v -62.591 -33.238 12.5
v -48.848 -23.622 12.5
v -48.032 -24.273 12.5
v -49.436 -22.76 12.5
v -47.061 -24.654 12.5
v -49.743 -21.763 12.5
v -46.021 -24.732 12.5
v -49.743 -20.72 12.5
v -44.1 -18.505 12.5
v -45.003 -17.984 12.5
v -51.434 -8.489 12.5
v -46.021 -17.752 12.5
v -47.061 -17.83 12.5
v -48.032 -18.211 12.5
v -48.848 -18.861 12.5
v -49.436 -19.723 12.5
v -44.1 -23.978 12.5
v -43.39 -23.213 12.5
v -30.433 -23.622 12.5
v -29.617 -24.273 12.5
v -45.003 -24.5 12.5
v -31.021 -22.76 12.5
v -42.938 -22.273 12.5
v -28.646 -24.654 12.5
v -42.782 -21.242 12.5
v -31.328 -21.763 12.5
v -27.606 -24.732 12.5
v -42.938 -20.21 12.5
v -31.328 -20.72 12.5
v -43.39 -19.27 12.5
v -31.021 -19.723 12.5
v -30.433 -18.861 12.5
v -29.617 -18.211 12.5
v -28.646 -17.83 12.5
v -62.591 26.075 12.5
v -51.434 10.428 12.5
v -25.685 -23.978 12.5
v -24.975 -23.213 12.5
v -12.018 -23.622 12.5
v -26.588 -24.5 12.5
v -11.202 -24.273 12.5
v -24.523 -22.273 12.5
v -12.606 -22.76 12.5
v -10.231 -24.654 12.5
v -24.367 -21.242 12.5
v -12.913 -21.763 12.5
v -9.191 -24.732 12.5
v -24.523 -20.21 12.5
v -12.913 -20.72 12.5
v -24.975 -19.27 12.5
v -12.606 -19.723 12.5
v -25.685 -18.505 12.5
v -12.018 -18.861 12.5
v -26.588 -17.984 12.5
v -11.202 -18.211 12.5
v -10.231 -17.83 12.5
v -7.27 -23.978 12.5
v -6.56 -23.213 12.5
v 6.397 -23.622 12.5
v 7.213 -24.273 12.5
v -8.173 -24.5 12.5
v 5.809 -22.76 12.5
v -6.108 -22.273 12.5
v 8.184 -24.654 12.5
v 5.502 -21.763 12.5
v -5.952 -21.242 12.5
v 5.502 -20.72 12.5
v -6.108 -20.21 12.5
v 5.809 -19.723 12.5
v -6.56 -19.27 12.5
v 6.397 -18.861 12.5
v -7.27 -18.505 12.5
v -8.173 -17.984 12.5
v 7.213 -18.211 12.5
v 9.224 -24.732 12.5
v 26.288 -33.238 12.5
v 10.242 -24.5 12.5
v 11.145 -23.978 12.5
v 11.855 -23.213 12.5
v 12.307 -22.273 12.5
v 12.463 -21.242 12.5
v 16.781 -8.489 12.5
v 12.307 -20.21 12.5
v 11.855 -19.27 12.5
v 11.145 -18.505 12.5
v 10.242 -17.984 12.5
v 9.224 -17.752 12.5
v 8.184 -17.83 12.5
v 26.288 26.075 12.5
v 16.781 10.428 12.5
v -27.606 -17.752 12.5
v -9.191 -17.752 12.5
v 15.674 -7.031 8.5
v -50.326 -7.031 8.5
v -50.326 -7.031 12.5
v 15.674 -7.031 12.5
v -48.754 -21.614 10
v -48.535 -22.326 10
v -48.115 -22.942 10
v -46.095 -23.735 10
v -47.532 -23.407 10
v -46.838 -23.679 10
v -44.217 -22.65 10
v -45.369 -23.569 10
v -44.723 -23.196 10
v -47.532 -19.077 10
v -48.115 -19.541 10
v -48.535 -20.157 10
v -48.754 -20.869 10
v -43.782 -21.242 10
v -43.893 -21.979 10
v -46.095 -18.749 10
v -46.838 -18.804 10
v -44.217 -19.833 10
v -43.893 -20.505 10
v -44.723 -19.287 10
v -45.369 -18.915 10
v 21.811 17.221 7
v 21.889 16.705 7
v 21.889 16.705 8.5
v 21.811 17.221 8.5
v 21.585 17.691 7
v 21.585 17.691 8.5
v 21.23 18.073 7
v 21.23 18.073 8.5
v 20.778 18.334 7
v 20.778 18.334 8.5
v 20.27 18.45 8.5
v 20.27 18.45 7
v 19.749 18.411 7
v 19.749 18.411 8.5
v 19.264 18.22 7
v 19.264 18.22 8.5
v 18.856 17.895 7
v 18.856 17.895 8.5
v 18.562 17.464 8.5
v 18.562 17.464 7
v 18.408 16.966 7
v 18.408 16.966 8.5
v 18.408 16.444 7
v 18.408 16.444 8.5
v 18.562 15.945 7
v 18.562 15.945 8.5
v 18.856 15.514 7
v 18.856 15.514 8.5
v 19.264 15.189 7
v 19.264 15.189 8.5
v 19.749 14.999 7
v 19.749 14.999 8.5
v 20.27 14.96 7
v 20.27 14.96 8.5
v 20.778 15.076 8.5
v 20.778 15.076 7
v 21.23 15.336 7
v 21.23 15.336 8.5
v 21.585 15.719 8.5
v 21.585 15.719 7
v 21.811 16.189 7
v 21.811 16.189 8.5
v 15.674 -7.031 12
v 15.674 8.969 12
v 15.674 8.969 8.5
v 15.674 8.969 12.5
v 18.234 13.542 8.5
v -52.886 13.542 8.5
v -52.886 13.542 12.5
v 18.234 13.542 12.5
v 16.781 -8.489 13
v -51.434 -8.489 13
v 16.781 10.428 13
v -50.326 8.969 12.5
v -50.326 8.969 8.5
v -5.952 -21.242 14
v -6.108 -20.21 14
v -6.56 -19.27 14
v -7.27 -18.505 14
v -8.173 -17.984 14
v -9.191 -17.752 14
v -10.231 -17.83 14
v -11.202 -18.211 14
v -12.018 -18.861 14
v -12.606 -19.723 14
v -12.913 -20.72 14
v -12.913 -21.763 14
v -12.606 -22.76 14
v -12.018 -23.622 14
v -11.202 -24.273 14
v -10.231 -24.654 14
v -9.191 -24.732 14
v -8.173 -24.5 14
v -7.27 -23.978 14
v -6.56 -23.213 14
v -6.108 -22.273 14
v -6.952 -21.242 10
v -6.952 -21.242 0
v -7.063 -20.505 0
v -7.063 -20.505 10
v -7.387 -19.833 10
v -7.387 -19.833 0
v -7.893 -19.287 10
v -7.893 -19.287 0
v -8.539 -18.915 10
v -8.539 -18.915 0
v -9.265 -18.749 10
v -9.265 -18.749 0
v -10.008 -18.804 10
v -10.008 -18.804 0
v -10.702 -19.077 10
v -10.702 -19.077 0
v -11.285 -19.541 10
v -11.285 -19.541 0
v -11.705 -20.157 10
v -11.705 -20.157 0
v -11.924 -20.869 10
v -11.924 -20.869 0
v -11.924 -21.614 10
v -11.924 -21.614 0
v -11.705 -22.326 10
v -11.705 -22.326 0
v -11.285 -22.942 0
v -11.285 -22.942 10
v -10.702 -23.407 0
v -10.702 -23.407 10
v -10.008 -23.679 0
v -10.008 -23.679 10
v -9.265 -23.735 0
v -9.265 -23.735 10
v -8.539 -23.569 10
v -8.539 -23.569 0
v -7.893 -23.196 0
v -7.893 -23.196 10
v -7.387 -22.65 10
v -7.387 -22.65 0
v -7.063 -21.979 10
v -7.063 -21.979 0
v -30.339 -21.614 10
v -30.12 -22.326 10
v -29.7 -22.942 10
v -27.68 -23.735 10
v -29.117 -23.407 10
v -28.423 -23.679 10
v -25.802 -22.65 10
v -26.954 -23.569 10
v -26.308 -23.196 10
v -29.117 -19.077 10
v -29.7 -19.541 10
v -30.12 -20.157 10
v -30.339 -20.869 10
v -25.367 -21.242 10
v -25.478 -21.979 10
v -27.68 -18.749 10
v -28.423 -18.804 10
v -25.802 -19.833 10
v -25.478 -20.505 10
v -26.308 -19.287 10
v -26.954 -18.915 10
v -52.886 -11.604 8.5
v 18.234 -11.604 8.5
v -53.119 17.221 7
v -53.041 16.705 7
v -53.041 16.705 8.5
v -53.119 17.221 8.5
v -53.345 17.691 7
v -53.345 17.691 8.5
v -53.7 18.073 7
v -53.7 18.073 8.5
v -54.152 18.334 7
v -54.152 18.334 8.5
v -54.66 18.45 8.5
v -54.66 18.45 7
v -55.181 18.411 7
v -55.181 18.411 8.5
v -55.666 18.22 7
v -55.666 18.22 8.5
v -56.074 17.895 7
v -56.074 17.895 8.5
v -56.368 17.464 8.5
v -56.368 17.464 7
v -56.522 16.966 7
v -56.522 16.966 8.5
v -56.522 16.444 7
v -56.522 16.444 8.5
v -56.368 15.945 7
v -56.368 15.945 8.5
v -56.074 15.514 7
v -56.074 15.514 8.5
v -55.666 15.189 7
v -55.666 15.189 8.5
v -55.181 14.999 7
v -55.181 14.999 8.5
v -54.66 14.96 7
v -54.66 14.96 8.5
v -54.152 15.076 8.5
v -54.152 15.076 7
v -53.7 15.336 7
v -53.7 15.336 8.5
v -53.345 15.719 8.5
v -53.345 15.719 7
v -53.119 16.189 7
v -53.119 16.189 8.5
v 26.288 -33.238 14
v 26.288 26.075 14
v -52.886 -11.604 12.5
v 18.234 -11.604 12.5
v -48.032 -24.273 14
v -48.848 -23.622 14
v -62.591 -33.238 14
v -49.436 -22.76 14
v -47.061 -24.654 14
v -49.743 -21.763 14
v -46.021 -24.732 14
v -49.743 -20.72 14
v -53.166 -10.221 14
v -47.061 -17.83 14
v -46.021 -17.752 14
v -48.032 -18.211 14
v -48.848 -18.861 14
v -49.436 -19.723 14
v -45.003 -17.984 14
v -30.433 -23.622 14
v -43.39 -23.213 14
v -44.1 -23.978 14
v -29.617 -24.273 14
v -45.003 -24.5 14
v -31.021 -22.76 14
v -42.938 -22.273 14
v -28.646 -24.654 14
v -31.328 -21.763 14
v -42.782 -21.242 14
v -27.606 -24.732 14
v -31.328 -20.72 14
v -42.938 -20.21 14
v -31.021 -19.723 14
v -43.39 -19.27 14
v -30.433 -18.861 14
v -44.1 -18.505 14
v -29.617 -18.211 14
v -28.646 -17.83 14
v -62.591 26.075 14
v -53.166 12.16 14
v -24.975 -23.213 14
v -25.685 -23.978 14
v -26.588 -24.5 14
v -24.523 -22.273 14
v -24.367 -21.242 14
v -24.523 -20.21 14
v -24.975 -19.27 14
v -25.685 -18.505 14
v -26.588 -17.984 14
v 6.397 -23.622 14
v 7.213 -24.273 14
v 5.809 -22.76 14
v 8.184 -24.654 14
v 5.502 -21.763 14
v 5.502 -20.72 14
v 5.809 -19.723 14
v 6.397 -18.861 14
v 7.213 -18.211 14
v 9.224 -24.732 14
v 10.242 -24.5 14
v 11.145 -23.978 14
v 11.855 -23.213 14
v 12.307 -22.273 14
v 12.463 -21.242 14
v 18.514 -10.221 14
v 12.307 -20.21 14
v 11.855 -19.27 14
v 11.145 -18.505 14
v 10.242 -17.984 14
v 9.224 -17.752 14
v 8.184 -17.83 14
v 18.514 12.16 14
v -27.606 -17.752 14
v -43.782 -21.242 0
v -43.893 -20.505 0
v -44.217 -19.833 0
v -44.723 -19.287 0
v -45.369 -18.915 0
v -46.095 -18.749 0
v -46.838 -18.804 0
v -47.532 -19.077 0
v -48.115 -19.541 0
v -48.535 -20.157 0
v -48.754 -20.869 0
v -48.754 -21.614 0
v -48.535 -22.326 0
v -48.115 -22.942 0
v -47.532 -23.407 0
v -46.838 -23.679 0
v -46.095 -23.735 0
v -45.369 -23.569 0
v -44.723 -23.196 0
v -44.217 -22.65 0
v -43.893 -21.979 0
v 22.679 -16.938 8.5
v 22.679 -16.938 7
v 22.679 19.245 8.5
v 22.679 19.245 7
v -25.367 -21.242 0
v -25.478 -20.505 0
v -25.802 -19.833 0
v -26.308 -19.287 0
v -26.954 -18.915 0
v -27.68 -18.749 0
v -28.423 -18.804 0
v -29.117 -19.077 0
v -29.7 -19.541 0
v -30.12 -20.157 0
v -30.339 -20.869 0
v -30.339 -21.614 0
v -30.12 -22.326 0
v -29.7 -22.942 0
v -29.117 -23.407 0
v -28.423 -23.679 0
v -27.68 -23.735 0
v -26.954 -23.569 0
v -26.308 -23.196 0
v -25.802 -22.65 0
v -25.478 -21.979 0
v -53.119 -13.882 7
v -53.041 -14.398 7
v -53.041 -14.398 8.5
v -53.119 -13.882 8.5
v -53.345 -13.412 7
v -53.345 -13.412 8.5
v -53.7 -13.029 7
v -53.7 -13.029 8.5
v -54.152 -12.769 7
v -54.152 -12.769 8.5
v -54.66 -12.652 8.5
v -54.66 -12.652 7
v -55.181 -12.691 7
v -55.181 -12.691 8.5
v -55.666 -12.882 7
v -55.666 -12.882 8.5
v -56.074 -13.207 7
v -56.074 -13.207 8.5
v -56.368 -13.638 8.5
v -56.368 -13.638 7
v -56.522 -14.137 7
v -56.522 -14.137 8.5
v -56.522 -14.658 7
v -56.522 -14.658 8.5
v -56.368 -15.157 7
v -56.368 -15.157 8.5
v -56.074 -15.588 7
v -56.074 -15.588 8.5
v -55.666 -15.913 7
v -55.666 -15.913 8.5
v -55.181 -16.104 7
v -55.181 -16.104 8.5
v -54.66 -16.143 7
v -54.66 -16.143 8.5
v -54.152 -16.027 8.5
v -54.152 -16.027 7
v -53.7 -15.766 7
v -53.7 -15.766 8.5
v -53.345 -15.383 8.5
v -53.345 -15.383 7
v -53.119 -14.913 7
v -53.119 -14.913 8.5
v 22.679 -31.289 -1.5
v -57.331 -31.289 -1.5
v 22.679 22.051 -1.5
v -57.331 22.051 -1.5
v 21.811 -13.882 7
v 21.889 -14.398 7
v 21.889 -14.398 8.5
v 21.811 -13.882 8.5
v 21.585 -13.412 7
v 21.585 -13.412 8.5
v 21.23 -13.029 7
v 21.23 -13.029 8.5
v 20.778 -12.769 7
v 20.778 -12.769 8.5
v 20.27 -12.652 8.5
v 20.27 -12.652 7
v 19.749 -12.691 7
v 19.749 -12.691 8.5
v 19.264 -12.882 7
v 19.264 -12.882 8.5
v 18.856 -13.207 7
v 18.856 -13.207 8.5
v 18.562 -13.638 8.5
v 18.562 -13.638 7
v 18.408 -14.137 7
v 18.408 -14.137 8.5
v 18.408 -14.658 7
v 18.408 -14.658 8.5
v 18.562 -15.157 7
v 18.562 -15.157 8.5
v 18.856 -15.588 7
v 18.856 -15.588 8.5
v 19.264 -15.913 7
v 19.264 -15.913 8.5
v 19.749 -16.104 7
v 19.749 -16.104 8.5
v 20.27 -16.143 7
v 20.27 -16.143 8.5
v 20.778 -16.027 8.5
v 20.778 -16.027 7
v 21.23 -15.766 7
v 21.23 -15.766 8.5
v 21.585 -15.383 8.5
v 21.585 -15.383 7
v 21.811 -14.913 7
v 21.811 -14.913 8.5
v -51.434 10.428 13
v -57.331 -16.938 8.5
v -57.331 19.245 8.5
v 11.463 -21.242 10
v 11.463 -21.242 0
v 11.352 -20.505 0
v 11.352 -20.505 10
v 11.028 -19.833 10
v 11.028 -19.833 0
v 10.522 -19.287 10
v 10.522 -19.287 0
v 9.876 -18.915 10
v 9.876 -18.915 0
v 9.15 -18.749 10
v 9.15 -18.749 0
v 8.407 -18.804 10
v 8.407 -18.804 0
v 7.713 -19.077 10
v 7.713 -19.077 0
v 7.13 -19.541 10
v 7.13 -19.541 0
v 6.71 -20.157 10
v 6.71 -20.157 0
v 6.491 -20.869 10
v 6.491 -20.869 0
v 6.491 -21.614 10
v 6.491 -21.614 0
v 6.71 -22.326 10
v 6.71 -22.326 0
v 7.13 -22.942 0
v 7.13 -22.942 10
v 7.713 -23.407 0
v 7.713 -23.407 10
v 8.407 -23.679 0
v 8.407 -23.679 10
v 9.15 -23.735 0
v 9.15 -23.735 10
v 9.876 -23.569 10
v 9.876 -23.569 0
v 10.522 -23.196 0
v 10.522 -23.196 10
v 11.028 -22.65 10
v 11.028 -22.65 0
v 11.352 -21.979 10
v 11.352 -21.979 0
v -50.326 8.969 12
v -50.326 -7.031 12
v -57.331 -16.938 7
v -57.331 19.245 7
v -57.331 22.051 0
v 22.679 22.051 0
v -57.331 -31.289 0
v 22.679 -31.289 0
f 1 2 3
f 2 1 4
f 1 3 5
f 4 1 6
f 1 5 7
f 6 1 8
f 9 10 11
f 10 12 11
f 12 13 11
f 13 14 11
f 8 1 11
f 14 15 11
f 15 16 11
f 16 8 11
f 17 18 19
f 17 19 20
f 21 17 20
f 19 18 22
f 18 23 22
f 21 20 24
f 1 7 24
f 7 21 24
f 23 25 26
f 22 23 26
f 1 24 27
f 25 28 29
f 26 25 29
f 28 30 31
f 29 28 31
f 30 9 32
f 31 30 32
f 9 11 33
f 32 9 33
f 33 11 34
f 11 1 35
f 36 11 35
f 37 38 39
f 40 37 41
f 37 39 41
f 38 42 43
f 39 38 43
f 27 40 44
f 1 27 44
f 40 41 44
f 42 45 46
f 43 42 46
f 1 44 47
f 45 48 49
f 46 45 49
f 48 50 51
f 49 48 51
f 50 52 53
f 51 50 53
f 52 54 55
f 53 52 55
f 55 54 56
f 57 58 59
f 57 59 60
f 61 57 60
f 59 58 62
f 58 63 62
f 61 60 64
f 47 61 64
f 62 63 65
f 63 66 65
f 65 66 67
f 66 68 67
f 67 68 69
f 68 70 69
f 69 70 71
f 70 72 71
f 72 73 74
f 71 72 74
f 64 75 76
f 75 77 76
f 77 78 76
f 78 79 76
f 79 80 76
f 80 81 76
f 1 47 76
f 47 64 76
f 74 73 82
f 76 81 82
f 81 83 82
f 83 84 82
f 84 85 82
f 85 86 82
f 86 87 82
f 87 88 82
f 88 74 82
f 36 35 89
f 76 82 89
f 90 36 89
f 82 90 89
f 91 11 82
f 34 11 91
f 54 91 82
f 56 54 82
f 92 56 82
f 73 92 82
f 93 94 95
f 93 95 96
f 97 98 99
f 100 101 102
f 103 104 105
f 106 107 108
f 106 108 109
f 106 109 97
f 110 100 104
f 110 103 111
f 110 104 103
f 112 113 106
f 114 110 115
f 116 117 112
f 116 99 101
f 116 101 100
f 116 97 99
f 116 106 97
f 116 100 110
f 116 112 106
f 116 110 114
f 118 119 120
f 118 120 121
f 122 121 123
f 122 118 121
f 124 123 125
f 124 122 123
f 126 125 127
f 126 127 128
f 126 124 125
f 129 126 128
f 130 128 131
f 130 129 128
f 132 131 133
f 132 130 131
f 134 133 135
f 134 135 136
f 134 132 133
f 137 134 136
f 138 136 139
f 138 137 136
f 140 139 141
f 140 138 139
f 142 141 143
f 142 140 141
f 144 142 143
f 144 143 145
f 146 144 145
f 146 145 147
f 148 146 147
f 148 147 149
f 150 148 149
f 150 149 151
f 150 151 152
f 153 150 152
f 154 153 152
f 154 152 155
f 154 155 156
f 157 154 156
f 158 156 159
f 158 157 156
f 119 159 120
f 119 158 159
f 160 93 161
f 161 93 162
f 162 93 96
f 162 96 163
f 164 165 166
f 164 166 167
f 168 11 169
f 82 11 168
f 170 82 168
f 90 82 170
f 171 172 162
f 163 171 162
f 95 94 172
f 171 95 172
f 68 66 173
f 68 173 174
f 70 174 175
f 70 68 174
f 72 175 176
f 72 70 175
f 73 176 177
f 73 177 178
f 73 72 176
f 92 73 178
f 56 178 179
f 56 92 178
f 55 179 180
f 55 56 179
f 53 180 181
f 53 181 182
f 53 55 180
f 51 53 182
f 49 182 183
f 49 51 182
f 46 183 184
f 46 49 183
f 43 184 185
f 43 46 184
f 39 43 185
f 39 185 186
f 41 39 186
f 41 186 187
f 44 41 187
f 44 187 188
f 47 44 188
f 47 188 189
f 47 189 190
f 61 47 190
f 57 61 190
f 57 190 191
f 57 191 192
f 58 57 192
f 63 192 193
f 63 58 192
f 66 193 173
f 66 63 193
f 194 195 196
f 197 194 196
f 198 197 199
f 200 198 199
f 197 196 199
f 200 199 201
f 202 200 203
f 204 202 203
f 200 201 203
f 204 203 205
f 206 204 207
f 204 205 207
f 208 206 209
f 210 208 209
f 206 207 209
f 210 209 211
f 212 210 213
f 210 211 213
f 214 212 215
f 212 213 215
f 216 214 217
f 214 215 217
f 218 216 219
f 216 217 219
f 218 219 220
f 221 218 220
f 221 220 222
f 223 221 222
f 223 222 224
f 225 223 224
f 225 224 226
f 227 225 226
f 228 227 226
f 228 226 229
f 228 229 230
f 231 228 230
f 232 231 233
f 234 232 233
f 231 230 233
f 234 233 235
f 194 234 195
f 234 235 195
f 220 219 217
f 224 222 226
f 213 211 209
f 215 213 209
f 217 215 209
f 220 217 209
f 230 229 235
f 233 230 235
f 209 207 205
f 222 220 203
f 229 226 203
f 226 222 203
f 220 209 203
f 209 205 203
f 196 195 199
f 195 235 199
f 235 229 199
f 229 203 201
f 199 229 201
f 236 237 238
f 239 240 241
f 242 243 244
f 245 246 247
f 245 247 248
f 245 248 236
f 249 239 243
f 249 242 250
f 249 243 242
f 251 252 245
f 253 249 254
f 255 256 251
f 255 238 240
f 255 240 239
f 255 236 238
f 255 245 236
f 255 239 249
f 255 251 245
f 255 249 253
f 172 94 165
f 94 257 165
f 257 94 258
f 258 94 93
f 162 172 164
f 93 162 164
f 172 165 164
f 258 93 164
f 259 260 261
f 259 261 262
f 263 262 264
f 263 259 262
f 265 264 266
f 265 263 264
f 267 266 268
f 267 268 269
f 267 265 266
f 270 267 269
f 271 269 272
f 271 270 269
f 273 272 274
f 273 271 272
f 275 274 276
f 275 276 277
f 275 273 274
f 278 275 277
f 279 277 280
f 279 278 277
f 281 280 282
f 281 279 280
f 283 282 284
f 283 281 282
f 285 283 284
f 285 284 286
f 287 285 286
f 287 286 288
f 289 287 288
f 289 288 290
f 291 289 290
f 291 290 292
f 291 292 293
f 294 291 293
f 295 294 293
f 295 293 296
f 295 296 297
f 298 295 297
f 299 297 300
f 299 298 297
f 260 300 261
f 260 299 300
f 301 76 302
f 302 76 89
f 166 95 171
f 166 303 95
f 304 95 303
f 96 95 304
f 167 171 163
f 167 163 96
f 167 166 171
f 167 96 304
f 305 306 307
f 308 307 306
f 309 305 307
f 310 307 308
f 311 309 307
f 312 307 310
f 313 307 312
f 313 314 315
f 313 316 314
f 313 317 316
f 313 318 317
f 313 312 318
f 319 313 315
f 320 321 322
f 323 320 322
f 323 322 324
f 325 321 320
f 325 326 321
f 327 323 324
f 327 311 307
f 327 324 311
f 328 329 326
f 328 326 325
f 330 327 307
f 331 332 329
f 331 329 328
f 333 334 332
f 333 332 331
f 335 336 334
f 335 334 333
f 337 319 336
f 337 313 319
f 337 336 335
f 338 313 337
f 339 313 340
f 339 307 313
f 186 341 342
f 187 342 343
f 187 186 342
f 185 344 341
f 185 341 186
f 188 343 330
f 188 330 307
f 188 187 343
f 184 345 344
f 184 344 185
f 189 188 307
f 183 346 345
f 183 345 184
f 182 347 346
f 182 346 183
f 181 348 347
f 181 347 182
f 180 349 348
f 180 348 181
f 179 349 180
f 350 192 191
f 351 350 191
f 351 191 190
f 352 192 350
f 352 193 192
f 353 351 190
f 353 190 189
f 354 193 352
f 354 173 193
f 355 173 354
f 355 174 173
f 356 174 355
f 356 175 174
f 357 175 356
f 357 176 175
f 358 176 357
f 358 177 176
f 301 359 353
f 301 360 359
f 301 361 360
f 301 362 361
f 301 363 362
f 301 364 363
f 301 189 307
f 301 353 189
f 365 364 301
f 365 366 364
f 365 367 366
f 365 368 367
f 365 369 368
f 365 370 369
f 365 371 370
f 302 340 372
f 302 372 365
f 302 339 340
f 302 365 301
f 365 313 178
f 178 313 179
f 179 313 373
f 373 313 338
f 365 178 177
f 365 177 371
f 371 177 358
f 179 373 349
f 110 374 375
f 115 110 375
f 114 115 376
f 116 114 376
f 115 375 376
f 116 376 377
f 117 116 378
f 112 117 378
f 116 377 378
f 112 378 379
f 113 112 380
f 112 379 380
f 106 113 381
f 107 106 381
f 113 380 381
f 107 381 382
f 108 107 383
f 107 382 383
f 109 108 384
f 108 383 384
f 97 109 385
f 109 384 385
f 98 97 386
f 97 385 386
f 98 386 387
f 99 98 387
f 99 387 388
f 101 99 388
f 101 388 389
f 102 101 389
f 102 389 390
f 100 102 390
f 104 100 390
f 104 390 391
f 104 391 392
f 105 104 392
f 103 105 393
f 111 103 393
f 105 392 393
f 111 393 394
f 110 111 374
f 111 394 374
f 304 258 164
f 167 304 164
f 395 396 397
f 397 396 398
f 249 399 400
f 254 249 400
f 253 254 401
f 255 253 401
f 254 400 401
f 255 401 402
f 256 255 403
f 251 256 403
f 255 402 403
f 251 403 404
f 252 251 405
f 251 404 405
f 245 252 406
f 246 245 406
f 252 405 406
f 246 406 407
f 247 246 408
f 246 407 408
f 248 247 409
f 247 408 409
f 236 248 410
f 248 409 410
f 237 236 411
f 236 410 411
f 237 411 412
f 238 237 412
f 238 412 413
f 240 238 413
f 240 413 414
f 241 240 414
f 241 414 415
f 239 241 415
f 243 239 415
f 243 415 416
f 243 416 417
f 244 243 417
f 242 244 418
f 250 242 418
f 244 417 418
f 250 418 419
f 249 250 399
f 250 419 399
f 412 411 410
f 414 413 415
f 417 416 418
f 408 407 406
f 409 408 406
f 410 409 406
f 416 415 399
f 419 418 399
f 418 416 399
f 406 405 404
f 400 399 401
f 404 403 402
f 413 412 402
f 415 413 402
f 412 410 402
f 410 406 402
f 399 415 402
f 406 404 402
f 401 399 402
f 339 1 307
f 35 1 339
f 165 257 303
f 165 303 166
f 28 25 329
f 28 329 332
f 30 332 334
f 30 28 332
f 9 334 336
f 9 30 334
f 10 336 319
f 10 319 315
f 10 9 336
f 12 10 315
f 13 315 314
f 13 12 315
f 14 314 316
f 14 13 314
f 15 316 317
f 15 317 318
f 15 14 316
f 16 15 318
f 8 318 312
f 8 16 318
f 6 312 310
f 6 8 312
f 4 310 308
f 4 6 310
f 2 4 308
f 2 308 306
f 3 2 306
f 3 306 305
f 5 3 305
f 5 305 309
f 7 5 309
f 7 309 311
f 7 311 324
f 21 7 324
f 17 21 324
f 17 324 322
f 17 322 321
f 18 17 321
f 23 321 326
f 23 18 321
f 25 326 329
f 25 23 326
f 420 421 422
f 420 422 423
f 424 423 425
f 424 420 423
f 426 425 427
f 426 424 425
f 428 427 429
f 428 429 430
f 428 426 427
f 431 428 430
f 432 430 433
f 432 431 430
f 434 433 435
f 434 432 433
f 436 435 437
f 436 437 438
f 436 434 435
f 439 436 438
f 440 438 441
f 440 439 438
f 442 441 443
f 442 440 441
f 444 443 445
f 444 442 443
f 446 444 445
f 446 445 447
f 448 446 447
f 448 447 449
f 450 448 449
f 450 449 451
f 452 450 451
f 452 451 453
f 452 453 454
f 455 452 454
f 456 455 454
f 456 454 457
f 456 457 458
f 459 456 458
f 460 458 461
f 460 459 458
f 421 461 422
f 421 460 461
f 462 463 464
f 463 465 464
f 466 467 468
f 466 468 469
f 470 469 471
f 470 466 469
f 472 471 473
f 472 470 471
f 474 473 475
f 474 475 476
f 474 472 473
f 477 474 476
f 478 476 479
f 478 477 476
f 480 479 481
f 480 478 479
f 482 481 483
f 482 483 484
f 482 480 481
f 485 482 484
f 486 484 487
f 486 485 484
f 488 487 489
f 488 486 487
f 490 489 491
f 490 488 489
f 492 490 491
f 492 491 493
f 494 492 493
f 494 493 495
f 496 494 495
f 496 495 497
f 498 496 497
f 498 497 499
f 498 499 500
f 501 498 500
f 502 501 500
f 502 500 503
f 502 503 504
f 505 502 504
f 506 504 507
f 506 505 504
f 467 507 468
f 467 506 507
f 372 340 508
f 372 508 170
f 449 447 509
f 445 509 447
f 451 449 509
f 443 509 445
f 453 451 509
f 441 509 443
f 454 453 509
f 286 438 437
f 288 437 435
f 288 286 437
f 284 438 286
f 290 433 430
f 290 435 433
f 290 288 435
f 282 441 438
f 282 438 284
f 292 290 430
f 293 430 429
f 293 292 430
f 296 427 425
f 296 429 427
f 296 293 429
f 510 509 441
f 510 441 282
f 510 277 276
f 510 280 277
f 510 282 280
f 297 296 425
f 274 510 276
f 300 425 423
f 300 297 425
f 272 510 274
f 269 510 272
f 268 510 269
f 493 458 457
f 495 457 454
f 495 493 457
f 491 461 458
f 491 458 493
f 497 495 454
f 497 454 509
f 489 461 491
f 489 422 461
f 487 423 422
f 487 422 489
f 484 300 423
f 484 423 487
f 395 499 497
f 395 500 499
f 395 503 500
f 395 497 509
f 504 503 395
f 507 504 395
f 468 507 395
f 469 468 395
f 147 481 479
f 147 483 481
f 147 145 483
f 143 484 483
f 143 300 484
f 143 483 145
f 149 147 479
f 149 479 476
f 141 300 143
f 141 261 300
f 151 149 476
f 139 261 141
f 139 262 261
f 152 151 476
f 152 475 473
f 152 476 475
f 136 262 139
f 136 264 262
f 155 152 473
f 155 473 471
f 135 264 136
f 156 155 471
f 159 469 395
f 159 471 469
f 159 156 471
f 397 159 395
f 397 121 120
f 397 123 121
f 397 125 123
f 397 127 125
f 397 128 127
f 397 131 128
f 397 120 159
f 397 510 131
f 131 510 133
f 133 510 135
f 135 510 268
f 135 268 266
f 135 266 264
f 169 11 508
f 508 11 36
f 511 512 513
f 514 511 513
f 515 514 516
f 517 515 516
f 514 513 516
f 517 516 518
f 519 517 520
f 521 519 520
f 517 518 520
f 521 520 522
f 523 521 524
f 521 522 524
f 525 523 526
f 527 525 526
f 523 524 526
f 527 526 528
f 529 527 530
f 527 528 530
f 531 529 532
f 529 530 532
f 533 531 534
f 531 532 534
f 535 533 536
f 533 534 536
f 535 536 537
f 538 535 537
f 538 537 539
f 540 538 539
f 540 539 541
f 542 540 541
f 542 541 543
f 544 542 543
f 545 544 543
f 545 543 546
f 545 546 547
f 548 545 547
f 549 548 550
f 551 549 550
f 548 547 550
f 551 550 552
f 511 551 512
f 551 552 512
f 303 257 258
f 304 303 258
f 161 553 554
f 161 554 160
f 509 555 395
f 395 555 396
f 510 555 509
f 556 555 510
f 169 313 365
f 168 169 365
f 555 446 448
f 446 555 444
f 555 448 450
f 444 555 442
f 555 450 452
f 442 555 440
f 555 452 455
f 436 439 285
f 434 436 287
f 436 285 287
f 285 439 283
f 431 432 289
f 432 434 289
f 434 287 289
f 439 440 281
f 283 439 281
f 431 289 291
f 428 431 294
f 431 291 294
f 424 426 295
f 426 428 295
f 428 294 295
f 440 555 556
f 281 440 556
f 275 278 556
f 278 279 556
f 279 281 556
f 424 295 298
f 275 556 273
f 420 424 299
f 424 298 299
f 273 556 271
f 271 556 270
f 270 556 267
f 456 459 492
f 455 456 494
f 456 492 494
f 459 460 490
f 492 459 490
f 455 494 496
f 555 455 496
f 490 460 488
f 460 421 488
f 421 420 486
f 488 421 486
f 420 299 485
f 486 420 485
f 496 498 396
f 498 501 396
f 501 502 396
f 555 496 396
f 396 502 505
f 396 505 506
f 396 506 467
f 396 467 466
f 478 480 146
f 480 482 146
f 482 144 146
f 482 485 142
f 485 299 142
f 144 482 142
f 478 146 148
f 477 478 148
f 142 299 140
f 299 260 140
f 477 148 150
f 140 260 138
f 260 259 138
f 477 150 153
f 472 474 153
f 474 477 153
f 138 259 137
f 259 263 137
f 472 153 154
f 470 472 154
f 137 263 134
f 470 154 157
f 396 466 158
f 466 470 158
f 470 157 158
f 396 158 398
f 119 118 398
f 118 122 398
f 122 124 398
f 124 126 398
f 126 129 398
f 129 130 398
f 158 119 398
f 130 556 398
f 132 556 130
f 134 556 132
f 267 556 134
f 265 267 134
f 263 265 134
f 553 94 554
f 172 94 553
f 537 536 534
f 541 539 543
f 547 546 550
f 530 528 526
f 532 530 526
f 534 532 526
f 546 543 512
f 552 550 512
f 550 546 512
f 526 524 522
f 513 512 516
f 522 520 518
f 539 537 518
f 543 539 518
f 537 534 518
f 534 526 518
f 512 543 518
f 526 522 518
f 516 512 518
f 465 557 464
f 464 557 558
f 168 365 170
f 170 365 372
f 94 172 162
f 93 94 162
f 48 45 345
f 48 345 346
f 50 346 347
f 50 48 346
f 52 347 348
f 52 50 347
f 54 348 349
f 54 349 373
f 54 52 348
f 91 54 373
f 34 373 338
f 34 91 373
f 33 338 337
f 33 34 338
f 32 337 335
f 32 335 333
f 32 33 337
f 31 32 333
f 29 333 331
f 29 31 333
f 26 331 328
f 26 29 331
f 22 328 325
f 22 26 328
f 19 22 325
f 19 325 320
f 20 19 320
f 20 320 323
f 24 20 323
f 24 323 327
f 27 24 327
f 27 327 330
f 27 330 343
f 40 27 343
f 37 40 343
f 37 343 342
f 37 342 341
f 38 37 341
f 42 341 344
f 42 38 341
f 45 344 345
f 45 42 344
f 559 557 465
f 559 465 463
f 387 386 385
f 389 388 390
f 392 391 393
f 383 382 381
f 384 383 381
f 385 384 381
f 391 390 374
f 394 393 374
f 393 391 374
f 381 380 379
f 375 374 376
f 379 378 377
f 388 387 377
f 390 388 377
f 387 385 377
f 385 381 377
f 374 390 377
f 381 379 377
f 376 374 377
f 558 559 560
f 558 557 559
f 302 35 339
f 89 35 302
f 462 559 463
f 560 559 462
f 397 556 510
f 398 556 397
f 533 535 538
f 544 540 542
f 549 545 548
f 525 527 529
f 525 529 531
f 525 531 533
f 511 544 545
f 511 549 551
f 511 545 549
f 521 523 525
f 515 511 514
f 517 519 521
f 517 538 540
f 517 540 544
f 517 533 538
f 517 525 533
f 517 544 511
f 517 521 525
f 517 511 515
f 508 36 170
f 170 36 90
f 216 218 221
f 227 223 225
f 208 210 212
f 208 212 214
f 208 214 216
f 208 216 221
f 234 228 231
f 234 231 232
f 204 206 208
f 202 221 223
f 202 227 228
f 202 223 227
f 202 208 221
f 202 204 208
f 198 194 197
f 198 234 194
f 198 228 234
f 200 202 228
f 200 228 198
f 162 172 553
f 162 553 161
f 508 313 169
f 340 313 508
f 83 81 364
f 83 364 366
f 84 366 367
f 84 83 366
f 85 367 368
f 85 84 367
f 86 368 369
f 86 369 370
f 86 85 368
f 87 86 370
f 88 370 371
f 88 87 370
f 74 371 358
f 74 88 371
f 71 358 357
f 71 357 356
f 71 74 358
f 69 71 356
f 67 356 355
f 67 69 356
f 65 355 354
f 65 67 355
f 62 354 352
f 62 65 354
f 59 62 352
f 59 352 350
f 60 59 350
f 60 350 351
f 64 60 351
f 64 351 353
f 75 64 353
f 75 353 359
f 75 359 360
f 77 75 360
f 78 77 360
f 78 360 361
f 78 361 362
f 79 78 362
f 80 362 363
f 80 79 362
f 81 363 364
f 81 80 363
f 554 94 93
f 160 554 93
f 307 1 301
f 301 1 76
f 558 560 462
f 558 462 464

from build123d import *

# Parameters (mm, degrees)
F0_W      = 80.01
F0_H      = 36.068
F0_W_2    = 71.247
F0_H_2    = 25.019
F0_W_3    = 66.04
F0_H_3    = 16.002
F0_H_4    = 14.351
F0_R      = 2.5
F0_H_5    = 2.921
F1_DEPTH  = 1.5
F2_DEPTH  = 10
F4_W      = 80.01
F4_H      = 36.1823
F4_R      = 1.75
F5_DEPTH  = 1.5
F6_W      = 71.12
F6_H      = 25.146
F6_W_2    = 66
F6_H_2    = 16
F7_DEPTH  = 4
F8_DEPTH  = 3.5
F9_W      = 88.8787768781
F9_H      = 59.3131650239
F9_R      = 3.5
F9_W_2    = 71.12
F9_H_2    = 25.146
F9_W_3    = 68.2152619944
F9_H_3    = 18.9172932116
F10_DEPTH = 1.5
F11_SIZE2 = 1.7320508076
F11_SIZE  = 1


# Not quite as in the source:
# - a feature of the source that left no trace in its solid (it failed there, or was rolled back) is left out


with BuildPart() as f1:
    # F0 (on Top) → F1 (new body)
    with BuildSketch(Plane.XY):
        with Locations((-17.3261313879, 1.0963964765)):
            Rectangle(F0_W, F0_H)
        with Locations((-17.2626313879, 1.0328964765)):
            Rectangle(F0_W_2, F0_H_2, mode=Mode.SUBTRACT)
        with Locations((-17.2626313879, 1.0328964765)):
            Rectangle(F0_W_2, F0_H_2)
        with Locations((-17.1991313879, 1.0963964765)):
            Rectangle(F0_W_3, F0_H_3, mode=Mode.SUBTRACT)
        with Locations((-17.3261313879, -24.1131035235)):
            Rectangle(F0_W, F0_H_4)
        with Locations((-46.2821313879, -21.2417540622)):
            Circle(F0_R, mode=Mode.SUBTRACT)
        with Locations((-27.8671313879, -21.2417540622)):
            Circle(F0_R, mode=Mode.SUBTRACT)
        with Locations((-9.4521313879, -21.2417540622)):
            Circle(F0_R, mode=Mode.SUBTRACT)
        with Locations((8.9628686121, -21.2417540622)):
            Circle(F0_R, mode=Mode.SUBTRACT)
        with Locations((-17.1991313879, 1.0963964765)):
            Rectangle(F0_W_3, F0_H_3)
        with Locations((-17.3261313879, 20.5908964765)):
            Rectangle(F0_W, F0_H_5)
        with Locations((-9.4521313879, -21.2417540622)):
            Circle(F0_R)
        with Locations((-46.2821313879, -21.2417540622)):
            Circle(F0_R)
        with Locations((-27.8671313879, -21.2417540622)):
            Circle(F0_R)
        with Locations((8.9628686121, -21.2417540622)):
            Circle(F0_R)
    extrude(amount=-F1_DEPTH)


with BuildPart() as f2:
    # F0 (on Top) → F2 (new body)
    with BuildSketch(Plane.XY):
        with Locations((-46.2821313879, -21.2417540622)):
            Circle(F0_R)
    extrude(amount=F2_DEPTH)


with BuildPart() as f2b:
    # F0 (on Top) → F2, piece 2 (new body)
    with BuildSketch(Plane.XY):
        with Locations((-27.8671313879, -21.2417540622)):
            Circle(F0_R)
    extrude(amount=F2_DEPTH)


with BuildPart() as f2c:
    # F0 (on Top) → F2, piece 3 (new body)
    with BuildSketch(Plane.XY):
        with Locations((-9.4521313879, -21.2417540622)):
            Circle(F0_R)
    extrude(amount=F2_DEPTH)


with BuildPart() as f2d:
    # F0 (on Top) → F2, piece 4 (new body)
    with BuildSketch(Plane.XY):
        with Locations((8.9628686121, -21.2417540622)):
            Circle(F0_R)
    extrude(amount=F2_DEPTH)


with BuildPart() as f5:
    # F4 (on offset) → F5 (new body)
    with BuildSketch(Plane.XY.offset(7)):
        with Locations((-17.3261313879, 1.1535464765)):
            Rectangle(F4_W, F4_H)
        with Locations((-54.7911313879, -14.3976035235)):
            Circle(F4_R, mode=Mode.SUBTRACT)
        with Locations((20.1388686121, -14.3976035235)):
            Circle(F4_R, mode=Mode.SUBTRACT)
        with Locations((-54.7911313879, 16.7046964765)):
            Circle(F4_R, mode=Mode.SUBTRACT)
        with Locations((20.1388686121, 16.7046964765)):
            Circle(F4_R, mode=Mode.SUBTRACT)
    extrude(amount=F5_DEPTH)


with BuildPart() as f7:
    # F6 (on face) → F7 (new body)
    with BuildSketch(Plane.XY.offset(8.5)):
        with Locations((-17.3261313879, 0.9693964765)):
            Rectangle(F6_W, F6_H)
        with Locations((-17.3261313879, 0.9693964765)):
            Rectangle(F6_W_2, F6_H_2, mode=Mode.SUBTRACT)
    extrude(amount=F7_DEPTH)


with BuildPart() as f8:
    # F6 (on face) → F8 (new body)
    with BuildSketch(Plane.XY.offset(8.5)):
        with Locations((-17.3261313879, 0.9693964765)):
            Rectangle(F6_W_2, F6_H_2)
    extrude(amount=F8_DEPTH)


with BuildPart() as f10:
    # F9 (on face) → F10 (new body)
    with BuildSketch(Plane.XY.offset(12.5)):
        with Locations((-18.1514117867, -3.5815080628)):
            Rectangle(F9_W, F9_H)
        with Locations((-46.2821313879, -21.2417540622)):
            Circle(F9_R, mode=Mode.SUBTRACT)
        with Locations((-27.8671313879, -21.2417540622)):
            Circle(F9_R, mode=Mode.SUBTRACT)
        with Locations((-9.4521313879, -21.2417540622)):
            Circle(F9_R, mode=Mode.SUBTRACT)
        with Locations((8.9628686121, -21.2417540622)):
            Circle(F9_R, mode=Mode.SUBTRACT)
        with Locations((-17.3261313879, 0.9693964765)):
            Rectangle(F9_W_2, F9_H_2, mode=Mode.SUBTRACT)
        with Locations((-17.3261313879, 0.9693964765)):
            Rectangle(F9_W_2, F9_H_2)
        with Locations((-17.3261313879, 0.9693964765)):
            Rectangle(F9_W_3, F9_H_3, mode=Mode.SUBTRACT)
    extrude(amount=F10_DEPTH)

    # F11
    f11_edges = [f10.edges().sort_by_distance(p)[0] for p in [
        (-17.326131, 10.428043, 14),
        (-51.433762, 0.969396, 14),
        (-17.326131, -8.48925, 14),
        (16.7815, 0.969396, 14),
    ]]
    chamfer(f11_edges, length=F11_SIZE, length2=F11_SIZE2)


solid = Compound([f1.part, f2.part, f2b.part, f2c.part, f2d.part, f5.part, f7.part, f8.part, f10.part])
